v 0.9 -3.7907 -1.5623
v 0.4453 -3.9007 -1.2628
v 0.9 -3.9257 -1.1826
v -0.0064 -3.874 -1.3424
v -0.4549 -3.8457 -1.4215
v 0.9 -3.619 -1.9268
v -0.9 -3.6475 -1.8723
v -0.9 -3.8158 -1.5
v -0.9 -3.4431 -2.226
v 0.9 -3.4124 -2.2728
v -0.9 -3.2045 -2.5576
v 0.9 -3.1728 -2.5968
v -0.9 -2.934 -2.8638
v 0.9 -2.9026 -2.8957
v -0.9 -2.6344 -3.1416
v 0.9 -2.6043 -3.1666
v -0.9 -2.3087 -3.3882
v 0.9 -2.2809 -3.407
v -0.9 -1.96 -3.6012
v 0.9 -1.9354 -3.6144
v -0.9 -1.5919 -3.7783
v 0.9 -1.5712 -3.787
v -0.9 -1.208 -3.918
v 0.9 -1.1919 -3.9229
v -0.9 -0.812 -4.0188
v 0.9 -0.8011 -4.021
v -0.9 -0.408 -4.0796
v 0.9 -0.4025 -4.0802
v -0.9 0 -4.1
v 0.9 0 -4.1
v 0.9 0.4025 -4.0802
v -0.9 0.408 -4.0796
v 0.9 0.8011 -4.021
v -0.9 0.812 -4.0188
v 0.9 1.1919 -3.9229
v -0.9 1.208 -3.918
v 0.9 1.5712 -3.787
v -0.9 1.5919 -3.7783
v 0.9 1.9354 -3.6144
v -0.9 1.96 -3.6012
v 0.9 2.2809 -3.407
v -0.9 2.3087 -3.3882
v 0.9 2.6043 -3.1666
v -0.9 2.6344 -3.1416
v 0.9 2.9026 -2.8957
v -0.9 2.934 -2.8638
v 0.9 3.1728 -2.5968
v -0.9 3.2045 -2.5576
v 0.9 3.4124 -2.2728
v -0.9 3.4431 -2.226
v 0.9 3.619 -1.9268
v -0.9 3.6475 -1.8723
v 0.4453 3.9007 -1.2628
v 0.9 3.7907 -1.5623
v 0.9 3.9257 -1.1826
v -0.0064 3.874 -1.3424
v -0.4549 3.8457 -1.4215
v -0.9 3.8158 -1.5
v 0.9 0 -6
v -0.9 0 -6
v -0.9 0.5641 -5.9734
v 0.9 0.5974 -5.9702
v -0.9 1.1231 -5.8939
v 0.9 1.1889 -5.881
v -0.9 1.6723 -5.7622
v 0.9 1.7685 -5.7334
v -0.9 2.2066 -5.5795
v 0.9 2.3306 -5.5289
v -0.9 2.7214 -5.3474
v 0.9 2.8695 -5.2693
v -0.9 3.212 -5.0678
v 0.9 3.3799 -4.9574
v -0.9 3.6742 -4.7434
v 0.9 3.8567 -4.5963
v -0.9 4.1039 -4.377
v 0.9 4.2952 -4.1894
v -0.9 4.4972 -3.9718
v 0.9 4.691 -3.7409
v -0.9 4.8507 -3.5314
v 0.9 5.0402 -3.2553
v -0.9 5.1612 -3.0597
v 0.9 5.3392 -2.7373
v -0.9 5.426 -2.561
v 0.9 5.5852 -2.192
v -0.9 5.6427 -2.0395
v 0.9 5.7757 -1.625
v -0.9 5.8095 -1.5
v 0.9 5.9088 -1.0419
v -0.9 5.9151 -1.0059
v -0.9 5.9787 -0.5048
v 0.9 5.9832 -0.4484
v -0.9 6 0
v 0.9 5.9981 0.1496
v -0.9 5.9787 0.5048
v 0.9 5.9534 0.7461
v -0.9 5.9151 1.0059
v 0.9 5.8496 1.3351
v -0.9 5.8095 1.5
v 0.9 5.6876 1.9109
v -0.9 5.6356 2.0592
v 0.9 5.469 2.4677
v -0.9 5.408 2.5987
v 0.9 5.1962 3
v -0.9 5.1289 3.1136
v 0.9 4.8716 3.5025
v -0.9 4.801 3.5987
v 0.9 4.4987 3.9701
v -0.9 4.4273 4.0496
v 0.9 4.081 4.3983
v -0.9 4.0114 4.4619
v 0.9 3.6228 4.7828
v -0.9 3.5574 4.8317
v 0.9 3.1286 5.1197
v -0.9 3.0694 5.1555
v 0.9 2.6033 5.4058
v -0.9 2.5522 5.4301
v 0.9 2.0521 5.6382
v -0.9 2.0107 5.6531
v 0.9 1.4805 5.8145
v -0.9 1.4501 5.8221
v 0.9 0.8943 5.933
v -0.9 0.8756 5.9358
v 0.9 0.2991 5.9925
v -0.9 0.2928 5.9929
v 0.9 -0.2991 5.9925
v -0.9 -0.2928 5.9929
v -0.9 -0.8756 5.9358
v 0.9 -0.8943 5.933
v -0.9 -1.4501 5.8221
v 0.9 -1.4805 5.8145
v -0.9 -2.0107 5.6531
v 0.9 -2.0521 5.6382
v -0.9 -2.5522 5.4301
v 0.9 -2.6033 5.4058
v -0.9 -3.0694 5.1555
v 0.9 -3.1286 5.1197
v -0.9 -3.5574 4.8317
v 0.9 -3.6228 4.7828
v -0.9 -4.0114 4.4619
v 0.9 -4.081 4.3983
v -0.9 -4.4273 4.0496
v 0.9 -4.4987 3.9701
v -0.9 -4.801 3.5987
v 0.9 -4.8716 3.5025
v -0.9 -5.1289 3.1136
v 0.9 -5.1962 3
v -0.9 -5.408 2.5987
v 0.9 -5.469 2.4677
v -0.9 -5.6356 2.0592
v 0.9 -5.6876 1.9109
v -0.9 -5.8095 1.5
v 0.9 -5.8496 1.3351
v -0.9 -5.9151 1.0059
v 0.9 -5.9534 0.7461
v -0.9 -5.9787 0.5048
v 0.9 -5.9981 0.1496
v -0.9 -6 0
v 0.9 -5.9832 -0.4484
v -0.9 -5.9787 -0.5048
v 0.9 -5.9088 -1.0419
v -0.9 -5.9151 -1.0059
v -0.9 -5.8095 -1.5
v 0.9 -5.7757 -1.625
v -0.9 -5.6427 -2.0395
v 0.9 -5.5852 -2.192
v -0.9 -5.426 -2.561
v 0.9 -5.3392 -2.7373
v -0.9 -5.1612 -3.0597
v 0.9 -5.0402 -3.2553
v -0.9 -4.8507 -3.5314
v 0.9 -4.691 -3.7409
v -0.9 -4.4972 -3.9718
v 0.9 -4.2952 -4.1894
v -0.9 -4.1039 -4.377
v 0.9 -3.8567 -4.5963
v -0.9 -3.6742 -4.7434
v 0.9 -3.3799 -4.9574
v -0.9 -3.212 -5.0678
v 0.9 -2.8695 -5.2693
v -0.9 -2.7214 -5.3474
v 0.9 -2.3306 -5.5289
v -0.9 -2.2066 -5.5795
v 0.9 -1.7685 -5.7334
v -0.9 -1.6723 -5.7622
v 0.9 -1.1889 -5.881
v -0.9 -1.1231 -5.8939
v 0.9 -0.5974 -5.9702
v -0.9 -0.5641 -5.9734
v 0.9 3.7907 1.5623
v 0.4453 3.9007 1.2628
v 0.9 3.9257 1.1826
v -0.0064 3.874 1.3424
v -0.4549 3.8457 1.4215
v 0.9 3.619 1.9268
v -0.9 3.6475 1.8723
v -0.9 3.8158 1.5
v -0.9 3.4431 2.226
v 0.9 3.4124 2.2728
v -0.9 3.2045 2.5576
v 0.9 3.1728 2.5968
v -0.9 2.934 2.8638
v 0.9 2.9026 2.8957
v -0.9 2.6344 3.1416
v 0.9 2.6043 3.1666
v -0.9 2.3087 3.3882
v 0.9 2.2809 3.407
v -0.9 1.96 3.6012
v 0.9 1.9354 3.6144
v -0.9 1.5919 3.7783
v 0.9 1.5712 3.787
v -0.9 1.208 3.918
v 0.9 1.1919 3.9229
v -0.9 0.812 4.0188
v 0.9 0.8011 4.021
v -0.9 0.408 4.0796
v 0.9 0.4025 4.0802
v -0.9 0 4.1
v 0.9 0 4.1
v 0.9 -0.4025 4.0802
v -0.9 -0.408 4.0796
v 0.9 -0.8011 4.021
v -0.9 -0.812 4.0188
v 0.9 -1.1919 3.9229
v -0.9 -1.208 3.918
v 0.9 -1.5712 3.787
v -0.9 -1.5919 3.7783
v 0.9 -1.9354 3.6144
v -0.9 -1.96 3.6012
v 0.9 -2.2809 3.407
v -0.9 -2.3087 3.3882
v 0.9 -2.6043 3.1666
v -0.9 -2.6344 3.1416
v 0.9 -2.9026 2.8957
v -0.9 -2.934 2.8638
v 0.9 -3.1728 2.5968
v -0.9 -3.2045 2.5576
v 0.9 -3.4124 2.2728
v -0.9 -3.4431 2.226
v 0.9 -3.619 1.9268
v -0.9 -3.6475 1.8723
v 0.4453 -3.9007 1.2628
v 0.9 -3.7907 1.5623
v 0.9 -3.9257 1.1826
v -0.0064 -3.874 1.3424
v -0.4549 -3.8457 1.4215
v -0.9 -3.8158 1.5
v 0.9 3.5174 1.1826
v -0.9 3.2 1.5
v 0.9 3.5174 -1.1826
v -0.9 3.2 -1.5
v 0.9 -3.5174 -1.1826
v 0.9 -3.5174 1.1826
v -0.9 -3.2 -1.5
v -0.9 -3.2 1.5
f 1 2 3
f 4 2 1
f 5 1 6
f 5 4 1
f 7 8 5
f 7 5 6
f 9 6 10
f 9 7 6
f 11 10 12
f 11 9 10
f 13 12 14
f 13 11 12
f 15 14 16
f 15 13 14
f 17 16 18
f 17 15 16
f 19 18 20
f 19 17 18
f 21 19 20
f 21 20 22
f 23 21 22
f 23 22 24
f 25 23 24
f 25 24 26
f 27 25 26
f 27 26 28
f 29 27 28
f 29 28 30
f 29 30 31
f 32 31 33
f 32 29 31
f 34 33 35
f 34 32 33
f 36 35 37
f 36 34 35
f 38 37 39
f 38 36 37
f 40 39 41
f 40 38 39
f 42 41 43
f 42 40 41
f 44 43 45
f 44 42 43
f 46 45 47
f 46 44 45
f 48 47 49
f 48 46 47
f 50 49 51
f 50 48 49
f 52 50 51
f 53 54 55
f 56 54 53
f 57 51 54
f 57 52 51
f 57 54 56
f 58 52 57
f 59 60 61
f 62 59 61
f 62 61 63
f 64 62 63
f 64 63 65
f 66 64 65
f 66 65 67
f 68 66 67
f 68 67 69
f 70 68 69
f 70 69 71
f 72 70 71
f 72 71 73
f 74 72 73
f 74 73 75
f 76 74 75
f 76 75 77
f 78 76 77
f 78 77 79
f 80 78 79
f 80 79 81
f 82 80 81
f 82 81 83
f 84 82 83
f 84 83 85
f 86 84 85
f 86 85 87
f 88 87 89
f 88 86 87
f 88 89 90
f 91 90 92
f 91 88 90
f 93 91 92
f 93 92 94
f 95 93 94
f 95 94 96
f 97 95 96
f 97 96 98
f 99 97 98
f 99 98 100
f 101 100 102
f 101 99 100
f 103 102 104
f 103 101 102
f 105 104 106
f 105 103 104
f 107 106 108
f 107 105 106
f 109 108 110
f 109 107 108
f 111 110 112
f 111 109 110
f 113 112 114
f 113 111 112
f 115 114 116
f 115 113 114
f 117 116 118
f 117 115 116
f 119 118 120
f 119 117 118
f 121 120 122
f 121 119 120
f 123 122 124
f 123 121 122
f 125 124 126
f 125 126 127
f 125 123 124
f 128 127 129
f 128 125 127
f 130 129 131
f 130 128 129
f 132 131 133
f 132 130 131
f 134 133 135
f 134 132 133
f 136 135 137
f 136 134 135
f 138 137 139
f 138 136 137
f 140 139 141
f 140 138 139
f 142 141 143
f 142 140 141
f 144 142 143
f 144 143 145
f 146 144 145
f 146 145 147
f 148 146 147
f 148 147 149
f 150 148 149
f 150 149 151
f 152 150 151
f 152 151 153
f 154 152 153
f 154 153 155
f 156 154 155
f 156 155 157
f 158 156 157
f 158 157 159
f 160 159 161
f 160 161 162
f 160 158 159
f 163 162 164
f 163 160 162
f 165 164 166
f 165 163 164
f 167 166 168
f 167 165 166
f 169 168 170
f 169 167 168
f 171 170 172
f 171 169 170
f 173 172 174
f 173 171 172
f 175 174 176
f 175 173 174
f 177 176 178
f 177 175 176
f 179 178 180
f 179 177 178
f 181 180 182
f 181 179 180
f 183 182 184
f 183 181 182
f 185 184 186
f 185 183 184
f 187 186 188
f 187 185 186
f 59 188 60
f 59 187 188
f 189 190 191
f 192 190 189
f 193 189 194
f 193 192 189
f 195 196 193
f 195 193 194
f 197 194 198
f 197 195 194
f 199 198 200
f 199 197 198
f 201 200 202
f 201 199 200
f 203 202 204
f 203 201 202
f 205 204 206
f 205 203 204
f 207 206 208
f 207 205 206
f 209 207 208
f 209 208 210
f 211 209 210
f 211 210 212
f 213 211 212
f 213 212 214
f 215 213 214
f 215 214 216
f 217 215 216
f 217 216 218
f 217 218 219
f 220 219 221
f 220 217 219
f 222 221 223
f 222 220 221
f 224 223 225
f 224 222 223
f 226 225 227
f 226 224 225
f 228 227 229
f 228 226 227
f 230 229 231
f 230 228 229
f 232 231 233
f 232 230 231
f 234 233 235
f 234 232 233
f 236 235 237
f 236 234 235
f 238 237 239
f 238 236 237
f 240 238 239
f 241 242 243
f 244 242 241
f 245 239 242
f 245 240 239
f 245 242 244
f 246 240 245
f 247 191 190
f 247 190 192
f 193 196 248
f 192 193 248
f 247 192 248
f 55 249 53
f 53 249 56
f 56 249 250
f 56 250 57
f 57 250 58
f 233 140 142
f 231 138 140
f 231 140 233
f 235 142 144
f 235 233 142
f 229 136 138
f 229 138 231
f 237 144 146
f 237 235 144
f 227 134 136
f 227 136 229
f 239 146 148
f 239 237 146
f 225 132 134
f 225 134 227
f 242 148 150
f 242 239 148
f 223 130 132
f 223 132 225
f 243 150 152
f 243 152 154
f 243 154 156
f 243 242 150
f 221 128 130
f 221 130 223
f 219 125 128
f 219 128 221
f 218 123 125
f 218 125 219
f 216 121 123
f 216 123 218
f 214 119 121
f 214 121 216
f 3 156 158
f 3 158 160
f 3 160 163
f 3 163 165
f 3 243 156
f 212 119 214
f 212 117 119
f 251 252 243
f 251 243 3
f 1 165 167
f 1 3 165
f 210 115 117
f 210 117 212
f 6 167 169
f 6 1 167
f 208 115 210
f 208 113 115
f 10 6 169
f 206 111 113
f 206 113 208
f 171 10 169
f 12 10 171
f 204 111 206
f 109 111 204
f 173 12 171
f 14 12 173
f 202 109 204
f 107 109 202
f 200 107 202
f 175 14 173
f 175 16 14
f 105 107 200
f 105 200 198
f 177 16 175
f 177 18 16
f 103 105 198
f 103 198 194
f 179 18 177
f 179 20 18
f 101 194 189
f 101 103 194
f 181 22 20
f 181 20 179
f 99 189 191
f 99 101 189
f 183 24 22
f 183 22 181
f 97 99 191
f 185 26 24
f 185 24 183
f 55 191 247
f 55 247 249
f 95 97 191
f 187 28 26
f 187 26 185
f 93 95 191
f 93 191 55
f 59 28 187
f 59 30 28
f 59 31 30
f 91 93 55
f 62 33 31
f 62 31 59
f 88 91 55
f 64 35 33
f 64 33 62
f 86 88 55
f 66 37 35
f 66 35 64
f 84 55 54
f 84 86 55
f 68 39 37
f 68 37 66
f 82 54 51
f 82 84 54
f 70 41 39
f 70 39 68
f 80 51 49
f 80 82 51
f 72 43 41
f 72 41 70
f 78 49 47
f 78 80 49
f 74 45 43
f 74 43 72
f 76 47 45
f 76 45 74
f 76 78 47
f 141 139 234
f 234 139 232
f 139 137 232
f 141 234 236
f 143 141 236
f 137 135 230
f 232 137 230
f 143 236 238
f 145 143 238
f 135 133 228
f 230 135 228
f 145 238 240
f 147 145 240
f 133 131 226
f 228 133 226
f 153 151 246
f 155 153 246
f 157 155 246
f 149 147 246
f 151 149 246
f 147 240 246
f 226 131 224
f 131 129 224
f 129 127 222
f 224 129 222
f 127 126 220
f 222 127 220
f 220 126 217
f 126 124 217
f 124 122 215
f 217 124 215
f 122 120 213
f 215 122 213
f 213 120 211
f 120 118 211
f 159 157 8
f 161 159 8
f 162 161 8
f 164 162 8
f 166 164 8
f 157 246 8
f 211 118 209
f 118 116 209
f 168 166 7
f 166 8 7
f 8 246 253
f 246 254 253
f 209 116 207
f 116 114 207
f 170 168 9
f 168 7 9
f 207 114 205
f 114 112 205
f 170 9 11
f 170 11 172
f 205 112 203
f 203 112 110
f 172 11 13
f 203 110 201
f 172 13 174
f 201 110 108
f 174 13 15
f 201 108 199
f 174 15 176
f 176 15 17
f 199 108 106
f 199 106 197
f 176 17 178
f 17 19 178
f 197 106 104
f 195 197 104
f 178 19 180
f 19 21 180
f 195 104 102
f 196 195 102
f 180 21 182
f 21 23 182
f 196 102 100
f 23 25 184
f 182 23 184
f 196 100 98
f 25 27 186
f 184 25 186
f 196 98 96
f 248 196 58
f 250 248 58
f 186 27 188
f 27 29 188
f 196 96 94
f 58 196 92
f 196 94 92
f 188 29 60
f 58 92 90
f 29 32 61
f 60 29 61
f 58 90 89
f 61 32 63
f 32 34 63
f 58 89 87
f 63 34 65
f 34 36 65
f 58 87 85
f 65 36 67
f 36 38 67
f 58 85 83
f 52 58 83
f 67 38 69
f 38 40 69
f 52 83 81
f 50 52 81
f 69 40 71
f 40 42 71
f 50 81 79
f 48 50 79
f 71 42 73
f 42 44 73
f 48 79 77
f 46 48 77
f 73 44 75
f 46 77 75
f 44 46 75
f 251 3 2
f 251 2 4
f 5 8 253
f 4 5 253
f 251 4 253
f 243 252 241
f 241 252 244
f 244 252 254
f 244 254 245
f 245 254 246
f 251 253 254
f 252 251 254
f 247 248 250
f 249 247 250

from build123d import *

# Parameters (mm, degrees)
SKETCH1_R                     = 6
SKETCH1_R_2                   = 4.1
BOSS_EXTRUDE1_DEPTH           = 0.9
BOSS_EXTRUDE2_START           = -0.9
BOSS_EXTRUDE2_DEPTH           = 1.8
BOSS_EXTRUDE2_DRAFT           = 10
BOSS_EXTRUDE2_PROFILE_2_DEPTH = 1.8
BOSS_EXTRUDE2_PROFILE_2_DRAFT = 10


with BuildPart() as part:
    # Sketch1 → Boss-Extrude1 (new, symmetric)
    with BuildSketch(Plane.YZ):
        with Locations(Location((0, 0, 0), (0, 0, 270))):
            Circle(SKETCH1_R)
        with Locations(Location((0, 0, 0), (0, 0, 270))):
            Circle(SKETCH1_R_2, mode=Mode.SUBTRACT)
    extrude(amount=BOSS_EXTRUDE1_DEPTH, both=True)


with BuildPart() as boss_extrude2_tool:
    # Sketch2 → Boss-Extrude2 (with draft: the straight prism first)
    with BuildSketch(Plane.YZ.offset(BOSS_EXTRUDE2_START)):
        with BuildLine():
            Line((5.809475019, 1.5), (3.2, 1.5))
            Line((3.2, 1.5), (3.2, -1.5))
            Line((3.2, -1.5), (5.809475019, -1.5))
            ThreePointArc((5.809475019, -1.5), (6, 0), (5.809475019, 1.5))
        make_face()
    extrude(amount=BOSS_EXTRUDE2_DEPTH)
    # Boss-Extrude2: the draft: its side faces are tilted about the plane it starts from
    boss_extrude2_sides = [boss_extrude2_tool.faces().sort_by_distance(p)[0] for p in [
        (0, 4.50473751, 1.5),
        (0, 3.2, 0),
        (0, 4.50473751, -1.5),
        (0, 6, 0),
    ]]
    draft(boss_extrude2_sides, Plane.YZ.offset(BOSS_EXTRUDE2_START), BOSS_EXTRUDE2_DRAFT)


with BuildPart() as part_1:
    add(part.part)

    # Boss-Extrude2: add boss_extrude2_tool
    add(boss_extrude2_tool.part)


with BuildPart() as boss_extrude2_profile_2_tool:
    # Sketch2 → Boss-Extrude2 profile 2 (with draft: the straight prism first)
    with BuildSketch(Plane.YZ.offset(BOSS_EXTRUDE2_START)):
        with BuildLine():
            ThreePointArc((-5.809475019, 1.5), (-6, 0), (-5.809475019, -1.5))
            Line((-5.809475019, -1.5), (-3.2, -1.5))
            Line((-3.2, -1.5), (-3.2, 1.5))
            Line((-3.2, 1.5), (-5.809475019, 1.5))
        make_face()
    extrude(amount=BOSS_EXTRUDE2_PROFILE_2_DEPTH)
    # Boss-Extrude2 profile 2: the draft: its side faces are tilted about the plane it starts from
    boss_extrude2_profile_2_sides = [boss_extrude2_profile_2_tool.faces().sort_by_distance(p)[0] for p in [
        (0, -6, 0),
        (0, -4.50473751, -1.5),
        (0, -3.2, 0),
        (0, -4.50473751, 1.5),
    ]]
    draft(boss_extrude2_profile_2_sides, Plane.YZ.offset(BOSS_EXTRUDE2_START), BOSS_EXTRUDE2_PROFILE_2_DRAFT)


with BuildPart() as part_2:
    add(part_1.part)

    # Boss-Extrude2 profile 2: add boss_extrude2_profile_2_tool
    add(boss_extrude2_profile_2_tool.part)


solid = part_2.part
